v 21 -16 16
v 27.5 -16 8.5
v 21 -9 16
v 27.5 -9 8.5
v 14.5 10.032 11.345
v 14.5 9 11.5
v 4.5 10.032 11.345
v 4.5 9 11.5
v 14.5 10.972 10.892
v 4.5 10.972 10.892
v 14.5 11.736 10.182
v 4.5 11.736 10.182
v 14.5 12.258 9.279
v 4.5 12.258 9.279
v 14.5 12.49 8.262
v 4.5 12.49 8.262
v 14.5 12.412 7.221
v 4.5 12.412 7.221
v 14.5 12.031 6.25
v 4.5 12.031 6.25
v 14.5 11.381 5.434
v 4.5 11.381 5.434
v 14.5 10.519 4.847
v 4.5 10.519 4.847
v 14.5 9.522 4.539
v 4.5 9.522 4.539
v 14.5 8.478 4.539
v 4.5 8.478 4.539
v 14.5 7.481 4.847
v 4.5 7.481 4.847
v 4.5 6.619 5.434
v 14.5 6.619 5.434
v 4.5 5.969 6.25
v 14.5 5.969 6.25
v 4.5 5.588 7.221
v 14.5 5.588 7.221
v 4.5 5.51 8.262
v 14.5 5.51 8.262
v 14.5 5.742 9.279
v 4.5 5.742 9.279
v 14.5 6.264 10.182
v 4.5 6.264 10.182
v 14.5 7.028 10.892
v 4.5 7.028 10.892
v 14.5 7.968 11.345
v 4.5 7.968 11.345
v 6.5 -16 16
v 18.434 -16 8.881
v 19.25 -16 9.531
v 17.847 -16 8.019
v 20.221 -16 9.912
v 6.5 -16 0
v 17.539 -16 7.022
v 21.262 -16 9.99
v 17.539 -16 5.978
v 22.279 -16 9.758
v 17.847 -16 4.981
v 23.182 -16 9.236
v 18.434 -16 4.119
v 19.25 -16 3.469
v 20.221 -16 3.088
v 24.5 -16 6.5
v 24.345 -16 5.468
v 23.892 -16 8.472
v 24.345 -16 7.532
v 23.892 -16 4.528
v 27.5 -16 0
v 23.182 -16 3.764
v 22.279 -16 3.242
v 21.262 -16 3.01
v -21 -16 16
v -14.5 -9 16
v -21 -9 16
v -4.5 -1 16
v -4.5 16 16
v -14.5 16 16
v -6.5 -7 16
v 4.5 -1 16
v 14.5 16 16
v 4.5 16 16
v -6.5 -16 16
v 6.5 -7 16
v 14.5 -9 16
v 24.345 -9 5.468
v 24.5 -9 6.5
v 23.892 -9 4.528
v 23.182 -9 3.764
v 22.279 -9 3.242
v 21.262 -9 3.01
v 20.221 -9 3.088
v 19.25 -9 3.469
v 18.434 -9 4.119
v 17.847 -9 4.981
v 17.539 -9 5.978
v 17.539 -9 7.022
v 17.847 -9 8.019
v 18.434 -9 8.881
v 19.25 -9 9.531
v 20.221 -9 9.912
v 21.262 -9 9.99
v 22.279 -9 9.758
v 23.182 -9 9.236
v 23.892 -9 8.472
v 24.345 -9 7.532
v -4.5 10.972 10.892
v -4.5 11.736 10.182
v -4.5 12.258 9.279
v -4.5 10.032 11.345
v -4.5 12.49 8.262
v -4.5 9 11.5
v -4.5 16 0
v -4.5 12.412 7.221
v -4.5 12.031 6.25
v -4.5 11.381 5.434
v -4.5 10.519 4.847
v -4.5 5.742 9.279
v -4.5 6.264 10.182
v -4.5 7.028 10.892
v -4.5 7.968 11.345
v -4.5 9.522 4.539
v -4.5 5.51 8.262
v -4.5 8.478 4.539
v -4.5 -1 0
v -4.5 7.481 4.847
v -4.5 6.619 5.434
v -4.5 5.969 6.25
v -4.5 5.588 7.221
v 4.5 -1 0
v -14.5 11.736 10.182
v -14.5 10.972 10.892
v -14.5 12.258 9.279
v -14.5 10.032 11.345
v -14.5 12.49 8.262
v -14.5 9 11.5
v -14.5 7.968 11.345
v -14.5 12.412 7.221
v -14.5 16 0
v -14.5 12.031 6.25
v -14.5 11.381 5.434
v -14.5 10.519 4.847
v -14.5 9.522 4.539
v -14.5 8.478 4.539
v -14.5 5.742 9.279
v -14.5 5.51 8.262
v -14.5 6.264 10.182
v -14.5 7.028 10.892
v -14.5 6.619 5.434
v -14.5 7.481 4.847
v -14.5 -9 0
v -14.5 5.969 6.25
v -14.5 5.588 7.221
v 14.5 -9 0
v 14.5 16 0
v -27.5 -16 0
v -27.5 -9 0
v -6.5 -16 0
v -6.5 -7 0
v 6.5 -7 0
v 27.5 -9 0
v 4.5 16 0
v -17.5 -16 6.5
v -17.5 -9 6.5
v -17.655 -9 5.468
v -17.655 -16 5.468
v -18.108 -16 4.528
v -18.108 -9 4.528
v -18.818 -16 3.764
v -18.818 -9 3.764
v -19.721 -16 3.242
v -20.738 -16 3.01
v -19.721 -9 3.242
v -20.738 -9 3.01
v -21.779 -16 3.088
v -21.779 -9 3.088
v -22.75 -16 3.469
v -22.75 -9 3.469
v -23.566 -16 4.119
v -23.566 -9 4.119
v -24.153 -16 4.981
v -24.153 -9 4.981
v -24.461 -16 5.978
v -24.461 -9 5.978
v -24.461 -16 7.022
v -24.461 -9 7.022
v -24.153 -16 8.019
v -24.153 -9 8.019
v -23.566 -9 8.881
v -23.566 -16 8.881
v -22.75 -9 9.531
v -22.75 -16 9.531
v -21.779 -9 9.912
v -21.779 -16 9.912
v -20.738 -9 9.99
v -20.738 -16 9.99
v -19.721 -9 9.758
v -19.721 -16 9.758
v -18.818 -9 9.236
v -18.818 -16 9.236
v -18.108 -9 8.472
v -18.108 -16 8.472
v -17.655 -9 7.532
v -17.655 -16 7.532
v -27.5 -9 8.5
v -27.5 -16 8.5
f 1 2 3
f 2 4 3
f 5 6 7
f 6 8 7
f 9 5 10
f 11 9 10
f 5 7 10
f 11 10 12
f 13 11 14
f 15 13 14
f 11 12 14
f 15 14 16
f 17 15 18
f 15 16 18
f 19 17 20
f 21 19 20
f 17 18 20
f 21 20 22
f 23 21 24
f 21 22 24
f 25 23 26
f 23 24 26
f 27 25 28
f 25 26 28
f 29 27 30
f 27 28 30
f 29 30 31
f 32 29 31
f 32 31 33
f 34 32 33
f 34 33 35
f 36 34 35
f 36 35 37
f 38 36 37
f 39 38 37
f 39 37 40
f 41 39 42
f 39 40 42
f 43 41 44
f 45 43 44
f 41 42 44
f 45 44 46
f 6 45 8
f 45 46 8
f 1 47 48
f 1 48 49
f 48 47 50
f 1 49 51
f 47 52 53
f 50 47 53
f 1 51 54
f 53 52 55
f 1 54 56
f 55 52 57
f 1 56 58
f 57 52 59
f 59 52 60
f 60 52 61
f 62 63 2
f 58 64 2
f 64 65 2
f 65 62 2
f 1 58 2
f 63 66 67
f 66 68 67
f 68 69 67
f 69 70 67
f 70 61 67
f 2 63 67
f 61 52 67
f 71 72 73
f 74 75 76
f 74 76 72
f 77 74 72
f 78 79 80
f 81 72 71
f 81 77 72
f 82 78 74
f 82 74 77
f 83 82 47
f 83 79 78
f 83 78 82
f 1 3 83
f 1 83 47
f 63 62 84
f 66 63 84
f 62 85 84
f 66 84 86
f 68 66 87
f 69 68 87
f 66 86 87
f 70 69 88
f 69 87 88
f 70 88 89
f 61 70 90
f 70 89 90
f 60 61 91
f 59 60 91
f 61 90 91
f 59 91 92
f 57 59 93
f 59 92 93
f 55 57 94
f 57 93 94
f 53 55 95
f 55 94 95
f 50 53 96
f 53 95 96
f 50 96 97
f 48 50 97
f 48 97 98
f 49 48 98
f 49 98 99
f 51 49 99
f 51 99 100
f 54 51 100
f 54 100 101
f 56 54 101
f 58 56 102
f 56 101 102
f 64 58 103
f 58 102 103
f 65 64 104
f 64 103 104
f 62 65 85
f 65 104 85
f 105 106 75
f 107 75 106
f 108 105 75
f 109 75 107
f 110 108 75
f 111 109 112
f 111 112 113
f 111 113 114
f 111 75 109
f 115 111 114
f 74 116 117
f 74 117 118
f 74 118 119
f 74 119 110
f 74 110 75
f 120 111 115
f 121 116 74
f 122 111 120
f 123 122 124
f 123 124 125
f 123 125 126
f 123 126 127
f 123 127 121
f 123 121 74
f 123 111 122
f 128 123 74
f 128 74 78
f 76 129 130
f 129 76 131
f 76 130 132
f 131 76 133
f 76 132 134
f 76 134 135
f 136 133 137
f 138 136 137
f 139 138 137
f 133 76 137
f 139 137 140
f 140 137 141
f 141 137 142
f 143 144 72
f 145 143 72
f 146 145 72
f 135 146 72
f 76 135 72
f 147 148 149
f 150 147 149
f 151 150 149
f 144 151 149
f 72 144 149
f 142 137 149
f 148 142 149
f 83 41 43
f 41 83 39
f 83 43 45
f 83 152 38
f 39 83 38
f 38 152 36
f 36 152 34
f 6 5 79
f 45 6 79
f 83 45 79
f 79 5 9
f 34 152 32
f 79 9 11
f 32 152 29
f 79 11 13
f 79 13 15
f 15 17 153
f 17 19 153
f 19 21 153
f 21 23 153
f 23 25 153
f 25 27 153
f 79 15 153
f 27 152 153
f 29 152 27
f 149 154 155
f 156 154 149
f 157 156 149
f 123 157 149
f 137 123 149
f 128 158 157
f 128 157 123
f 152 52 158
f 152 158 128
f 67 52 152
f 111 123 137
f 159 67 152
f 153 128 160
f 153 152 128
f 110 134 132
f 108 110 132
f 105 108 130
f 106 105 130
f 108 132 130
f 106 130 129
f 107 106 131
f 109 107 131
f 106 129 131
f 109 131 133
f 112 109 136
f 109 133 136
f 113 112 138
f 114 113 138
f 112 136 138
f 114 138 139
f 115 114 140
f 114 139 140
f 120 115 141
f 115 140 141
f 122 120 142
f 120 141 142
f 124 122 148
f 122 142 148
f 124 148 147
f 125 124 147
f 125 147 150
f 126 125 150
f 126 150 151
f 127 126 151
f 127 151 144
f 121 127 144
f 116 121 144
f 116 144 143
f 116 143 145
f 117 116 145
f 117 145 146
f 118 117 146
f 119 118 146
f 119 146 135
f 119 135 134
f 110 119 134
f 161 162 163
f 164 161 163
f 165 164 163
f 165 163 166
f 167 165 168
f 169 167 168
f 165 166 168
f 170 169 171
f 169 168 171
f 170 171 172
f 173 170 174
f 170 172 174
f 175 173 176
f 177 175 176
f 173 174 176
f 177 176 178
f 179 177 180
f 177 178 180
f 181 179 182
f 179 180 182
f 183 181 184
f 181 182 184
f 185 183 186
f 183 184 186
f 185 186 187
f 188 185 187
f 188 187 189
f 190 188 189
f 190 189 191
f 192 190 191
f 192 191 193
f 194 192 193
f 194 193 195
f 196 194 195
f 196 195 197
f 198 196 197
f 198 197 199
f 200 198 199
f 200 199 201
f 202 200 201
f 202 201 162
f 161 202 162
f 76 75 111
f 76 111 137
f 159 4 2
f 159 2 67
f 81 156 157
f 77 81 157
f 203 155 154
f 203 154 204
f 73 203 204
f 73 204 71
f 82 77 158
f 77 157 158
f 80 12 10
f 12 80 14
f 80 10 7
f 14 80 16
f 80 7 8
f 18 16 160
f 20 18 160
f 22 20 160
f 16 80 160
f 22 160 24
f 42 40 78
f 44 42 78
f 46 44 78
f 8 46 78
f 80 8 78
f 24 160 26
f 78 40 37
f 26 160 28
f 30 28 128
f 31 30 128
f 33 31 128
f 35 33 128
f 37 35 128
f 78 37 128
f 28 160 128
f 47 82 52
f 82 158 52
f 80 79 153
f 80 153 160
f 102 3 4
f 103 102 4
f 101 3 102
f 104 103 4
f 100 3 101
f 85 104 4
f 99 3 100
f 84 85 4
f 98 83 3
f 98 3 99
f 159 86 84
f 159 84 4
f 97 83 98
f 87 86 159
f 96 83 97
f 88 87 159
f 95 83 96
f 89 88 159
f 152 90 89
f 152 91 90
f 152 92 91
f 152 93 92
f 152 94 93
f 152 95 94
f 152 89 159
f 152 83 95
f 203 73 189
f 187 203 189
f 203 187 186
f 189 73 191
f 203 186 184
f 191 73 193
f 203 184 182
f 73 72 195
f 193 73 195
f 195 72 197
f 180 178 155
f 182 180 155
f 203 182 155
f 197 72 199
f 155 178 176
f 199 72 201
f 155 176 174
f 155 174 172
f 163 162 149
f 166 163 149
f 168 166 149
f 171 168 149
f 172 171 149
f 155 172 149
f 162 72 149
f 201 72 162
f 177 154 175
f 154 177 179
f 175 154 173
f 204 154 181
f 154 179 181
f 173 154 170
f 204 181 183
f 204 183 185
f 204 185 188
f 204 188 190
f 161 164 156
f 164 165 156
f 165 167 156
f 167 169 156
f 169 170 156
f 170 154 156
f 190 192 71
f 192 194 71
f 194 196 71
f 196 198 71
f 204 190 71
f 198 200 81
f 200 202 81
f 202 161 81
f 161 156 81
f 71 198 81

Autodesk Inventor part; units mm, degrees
ref_plane "YZ Plane" through (0, 0, 0) normal (1, 0, 0) x (0, 1, 0)
ref_plane "XZ Plane" through (0, 0, 0) normal (0, 1, 0) x (-1, 0, 0)
ref_plane "XY Plane" through (0, 0, 0) normal (0, 0, 1) x (1, 0, 0)
sketch "Sketch1" plane through (0, 0, 0) normal (0, 0, 1) x (1, 0, 0)
  line L0 (-14.5, -16) -> (14.5, -16)
  line L1 (14.5, -16) -> (14.5, 16)
  line L2 (14.5, 16) -> (-14.5, 16)
  line L3 (-14.5, 16) -> (-14.5, -16)
  line L4 (-14.5, -16) -> (14.5, 16) construction
  line L5 (14.5, -16) -> (-14.5, 16) construction
  line L6 (-6.5, -16) -> (-6.5, -7)
  line L7 (6.5, -7) -> (6.5, -16)
  line L8 (-6.5, -7) -> (6.5, -7)
  line L9 (-4.5, -1) -> (4.5, -1)
  line L10 (-4.5, 16) -> (-4.5, -1)
  line L11 (4.5, 16) -> (4.5, -1)
  point P0 (0, 0)
  dimension "d0" = 29
  dimension "d1" = 32
  dimension "d8" = 9
  dimension "d9" = 8
  dimension "d10" = 8
  dimension "d11" = 9
  dimension "d12" = 17
extrude "Extrusion1" add sketch "Sketch1" along normal blind 16 contours L3 L2 L10 L9 L11 L1 L0 L7 L8 L6
sketch "Sketch2" plane through (14.5, -16, 0) normal (1, 0, 0) x (0, 0, -1)
  line L0 (-16, 32) -> (-16, 0) projected
  line L1 (-16, 7) -> (0, 7)
  line L2 (0, 0) -> (-16, 0) projected
  line L3 (-16, 9) -> (-16, 0) projected
  line L4 (-16, 7) -> (-16, 0)
  line L5 (0, 0) -> (-16, 0) projected
  line L6 (-16, 0) -> (0, 0)
  line L7 (0, 0) -> (0, 7)
  line L8 (0, 0) -> (0, 9) projected
  point P0 (0, 16)
  dimension "d15" = 7
extrude "Extrusion2" add sketch "Sketch2" along normal blind 13
sketch "Sketch3" plane through (-14.5, -16, 0) normal (-1, 0, 0) x (0, 0, 1)
  line L0 (0, 0) -> (16, 0) projected
  line L1 (0, 0) -> (0, 7) projected
  line L2 (0, 0) -> (0, 7)
  line L3 (16, 7) -> (0, 7) projected
  line L4 (0, 7) -> (16, 7)
  line L5 (16, 7) -> (16, 0)
  line L6 (16, 0) -> (0, 0)
  point P0 (0, 16)
  dimension "d18" = 7
extrude "Extrusion3" add sketch "Sketch3" along normal blind 13
sketch "Sketch4" plane through (-14.5, 16, 0) normal (-1, 0, 0) x (0, 0, 1)
  circle A0 centre (8, -7) radius 3.5
  line L0 (0, 0) -> (16, 0) projected
  line L1 (16, 0) -> (16, -25) projected
  line L2 (0, 0) -> (0, -25) projected
  point P0 (0, -16)
  dimension "d21" = 7
  dimension "d22" = 7
  dimension "d23" = 16
  dimension "d24" = 8
extrude "Extrusion4" cut sketch "Sketch4" against normal through all
sketch "Sketch5" plane through (14.5, -9, 16) normal (0, 1, 0) x (1, 0, 0)
  line L0 (0, 0) -> (0, 16) projected
  line L1 (0, 0) -> (13, 0) projected
  line L2 (13, 16) -> (13, 0) projected
  line L3 (0, 16) -> (13, 16) projected
  line L4 (13, 16) -> (13, 6)
  line L5 (13, 0) -> (5.5, 0)
  line L6 (0, 0) -> (13, 0) projected
  line L7 (13, 16) -> (13, 0) projected
  line L8 (13, 0) -> (13, 6)
  circle A0 centre (6.5, 9.5) radius 3.5
  point P0 (-14.5, 16)
  dimension "d28" = 10
  dimension "d29" = 7.5
  dimension "d36" = 7
extrude "Extrusion5" cut sketch "Sketch5" against normal through all contours A0
sketch "Sketch6" plane through (14.5, -9, 16) normal (0, 1, 0) x (1, 0, 0)
  line L0 (-8, 0) -> (13, 0) projected
  line L1 (13, 0) -> (6.5, 0)
  line L2 (13, 0) -> (13, 7.5)
  line L3 (13, 0) -> (13, 16) projected
  line L4 (13, 7.5) -> (6.5, 0)
  point P0 (-14.5, 16)
  dimension "d39" = 6.5
  dimension "d40" = 7.5
extrude "Extrusion6" cut sketch "Sketch6" against normal through all
sketch "Sketch7" plane through (-14.5, -9, 16) normal (0, 1, 0) x (1, 0, 0)
  line L0 (8, 16) -> (-13, 16) projected
  line L1 (-13, 16) -> (-13, 0) projected
  circle A0 centre (-6.5, 9.5) radius 3.5
  line L2 (-13, 0) -> (-13, 7.5)
  line L3 (8, 0) -> (-13, 0) projected
  line L4 (-13, 0) -> (-6.5, 0)
  line L5 (-6.5, 0) -> (-13, 7.5)
  point P0 (14.5, 16)
  dimension "d44" = 7
  dimension "d46" = 7.5
  dimension "d47" = 6.5
extrude "Extrusion7" cut sketch "Sketch7" against normal through all contours A0
sketch "Sketch8" plane through (-14.5, -9, 16) normal (0, 1, 0) x (1, 0, 0)
  line L0 (8, 0) -> (-13, 0) projected
  line L1 (-13, 0) -> (-6.5, 0)
  line L2 (-6.5, 0) -> (-13, 0)
  line L3 (-13, 0) -> (-13, 7.5)
  line L4 (-13, 16) -> (-13, 0) projected
  line L5 (-13, 7.5) -> (-6.5, 0)
  point P0 (14.5, 16)
  dimension "d50" = 6.5
  dimension "d51" = 7.5
extrude "Extrusion8" cut sketch "Sketch8" against normal through all
properties part number "cad@26" material "Iron, Cast"
